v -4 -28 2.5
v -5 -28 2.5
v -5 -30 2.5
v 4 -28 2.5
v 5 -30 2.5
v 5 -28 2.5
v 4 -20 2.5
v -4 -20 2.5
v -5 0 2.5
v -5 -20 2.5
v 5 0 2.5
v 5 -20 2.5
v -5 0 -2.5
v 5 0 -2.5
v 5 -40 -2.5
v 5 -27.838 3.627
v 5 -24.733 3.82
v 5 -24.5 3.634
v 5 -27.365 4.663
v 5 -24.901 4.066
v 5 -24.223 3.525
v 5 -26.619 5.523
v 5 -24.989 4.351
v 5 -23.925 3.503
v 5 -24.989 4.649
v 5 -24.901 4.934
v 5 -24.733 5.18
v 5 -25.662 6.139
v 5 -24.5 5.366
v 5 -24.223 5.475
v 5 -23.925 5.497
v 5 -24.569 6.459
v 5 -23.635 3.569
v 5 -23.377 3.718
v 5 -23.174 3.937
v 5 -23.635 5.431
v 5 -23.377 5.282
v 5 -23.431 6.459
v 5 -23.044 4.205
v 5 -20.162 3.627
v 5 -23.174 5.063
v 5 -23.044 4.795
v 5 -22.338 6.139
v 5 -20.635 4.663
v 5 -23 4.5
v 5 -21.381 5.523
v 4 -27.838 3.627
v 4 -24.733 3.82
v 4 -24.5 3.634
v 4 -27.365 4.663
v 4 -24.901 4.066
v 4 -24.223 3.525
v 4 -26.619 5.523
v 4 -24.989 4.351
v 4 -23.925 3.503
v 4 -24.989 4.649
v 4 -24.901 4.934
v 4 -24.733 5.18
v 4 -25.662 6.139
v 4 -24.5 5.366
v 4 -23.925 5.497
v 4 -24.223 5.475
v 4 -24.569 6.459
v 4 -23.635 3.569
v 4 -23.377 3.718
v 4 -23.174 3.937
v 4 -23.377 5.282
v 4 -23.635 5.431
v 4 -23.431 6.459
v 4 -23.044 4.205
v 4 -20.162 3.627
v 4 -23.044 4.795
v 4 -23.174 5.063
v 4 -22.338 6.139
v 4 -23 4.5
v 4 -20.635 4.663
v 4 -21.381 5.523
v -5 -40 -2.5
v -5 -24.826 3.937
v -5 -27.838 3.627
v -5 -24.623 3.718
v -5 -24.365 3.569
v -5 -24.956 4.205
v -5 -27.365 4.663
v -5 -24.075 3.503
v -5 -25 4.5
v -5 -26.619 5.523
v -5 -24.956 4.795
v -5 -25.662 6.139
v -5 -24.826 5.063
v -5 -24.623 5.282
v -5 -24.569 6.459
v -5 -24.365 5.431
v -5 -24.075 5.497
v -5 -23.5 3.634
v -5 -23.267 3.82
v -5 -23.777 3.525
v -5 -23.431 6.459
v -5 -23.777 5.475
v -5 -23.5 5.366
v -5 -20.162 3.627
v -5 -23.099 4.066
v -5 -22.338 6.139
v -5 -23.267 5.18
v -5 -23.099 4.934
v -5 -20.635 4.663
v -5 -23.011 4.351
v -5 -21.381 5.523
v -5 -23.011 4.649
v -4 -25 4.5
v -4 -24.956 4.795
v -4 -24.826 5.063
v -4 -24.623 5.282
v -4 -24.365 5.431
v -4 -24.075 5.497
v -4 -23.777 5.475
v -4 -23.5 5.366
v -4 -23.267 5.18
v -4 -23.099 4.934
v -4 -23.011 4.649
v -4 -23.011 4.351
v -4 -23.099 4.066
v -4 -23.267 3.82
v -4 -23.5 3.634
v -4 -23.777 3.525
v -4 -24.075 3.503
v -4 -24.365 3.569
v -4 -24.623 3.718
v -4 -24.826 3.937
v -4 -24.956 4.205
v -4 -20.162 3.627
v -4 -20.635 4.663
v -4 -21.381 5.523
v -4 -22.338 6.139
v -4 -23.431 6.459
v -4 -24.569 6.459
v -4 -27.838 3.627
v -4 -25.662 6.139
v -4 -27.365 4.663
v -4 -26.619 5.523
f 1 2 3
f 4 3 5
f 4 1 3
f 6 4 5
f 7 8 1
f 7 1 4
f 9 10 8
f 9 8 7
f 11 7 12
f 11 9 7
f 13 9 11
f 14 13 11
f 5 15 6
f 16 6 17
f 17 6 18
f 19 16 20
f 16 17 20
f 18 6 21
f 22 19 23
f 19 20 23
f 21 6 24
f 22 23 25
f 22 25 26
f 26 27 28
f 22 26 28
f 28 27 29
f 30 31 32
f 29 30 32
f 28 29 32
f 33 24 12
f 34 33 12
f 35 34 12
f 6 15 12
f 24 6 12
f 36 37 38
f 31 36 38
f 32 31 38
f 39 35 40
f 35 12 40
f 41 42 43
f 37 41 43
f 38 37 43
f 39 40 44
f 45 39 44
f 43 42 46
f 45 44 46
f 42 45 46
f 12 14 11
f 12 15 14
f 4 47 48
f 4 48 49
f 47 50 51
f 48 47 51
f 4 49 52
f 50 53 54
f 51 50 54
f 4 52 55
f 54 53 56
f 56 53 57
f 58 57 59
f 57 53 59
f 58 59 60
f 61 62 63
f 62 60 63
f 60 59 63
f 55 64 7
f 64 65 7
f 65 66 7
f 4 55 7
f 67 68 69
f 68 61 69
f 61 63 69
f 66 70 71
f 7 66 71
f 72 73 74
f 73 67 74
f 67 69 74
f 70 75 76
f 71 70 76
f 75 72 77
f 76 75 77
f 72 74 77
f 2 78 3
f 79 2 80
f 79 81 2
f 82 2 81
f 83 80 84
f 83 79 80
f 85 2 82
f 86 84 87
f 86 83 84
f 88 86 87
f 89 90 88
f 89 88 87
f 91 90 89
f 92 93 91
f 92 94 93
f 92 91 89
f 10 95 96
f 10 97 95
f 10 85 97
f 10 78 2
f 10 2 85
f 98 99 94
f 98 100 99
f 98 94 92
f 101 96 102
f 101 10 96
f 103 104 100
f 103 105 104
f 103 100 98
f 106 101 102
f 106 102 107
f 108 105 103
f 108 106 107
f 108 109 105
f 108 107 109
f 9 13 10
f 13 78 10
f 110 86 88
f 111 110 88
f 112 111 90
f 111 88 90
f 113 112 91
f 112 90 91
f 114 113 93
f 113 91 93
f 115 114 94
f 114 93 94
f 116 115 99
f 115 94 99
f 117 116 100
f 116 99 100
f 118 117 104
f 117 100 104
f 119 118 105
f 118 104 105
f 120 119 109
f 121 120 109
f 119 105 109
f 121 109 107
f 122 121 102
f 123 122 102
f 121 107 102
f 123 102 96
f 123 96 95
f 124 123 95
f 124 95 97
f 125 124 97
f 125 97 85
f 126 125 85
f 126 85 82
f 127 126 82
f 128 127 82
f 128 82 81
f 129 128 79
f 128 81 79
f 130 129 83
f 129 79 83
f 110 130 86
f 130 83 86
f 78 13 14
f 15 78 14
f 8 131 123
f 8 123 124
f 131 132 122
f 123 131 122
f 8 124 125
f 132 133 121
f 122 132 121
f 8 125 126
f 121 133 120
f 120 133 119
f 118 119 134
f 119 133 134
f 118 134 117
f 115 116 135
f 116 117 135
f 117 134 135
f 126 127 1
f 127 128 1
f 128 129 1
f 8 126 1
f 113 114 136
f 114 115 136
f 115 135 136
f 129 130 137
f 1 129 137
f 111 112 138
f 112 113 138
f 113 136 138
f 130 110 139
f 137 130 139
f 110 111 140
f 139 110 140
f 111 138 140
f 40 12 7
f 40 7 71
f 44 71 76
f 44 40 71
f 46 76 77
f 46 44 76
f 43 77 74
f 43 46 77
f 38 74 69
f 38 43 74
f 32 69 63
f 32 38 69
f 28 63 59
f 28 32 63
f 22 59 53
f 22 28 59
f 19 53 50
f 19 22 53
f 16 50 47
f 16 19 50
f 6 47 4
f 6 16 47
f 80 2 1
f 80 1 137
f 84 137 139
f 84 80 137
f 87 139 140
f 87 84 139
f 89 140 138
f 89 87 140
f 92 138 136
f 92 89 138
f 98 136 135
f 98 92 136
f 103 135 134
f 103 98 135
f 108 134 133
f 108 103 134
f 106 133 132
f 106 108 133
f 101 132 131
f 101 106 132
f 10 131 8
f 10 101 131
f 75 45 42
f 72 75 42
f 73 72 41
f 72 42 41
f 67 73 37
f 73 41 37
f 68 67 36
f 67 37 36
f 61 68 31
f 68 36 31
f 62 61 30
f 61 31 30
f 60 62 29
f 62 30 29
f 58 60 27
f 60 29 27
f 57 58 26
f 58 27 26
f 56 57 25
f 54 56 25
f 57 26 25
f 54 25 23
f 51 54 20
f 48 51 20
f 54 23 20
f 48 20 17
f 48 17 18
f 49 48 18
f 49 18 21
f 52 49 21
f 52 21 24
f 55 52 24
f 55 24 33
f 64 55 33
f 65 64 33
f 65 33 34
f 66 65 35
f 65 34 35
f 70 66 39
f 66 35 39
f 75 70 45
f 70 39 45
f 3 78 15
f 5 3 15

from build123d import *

# Parameters (mm, degrees)
F0_W     = 10
F0_H     = 5
F1_DEPTH = 40
F2_R     = 1
F3_DEPTH = 1
F4_R     = 1
F5_DEPTH = 1
F6_SIZE2 = 4.99999
F6_SIZE  = 9.99999


# Not quite as in the source:
# - a fillet or chamfer is up to 0.001 mm smaller than in the source, because OpenCascade refuses the exact size


with BuildPart() as f1:
    # F0 (on Front) → F1 (new body)
    with BuildSketch(Plane.XZ):
        Rectangle(F0_W, F0_H)
    extrude(amount=F1_DEPTH)

    # F2 (on face) → F3 (join)
    with BuildSketch(Plane.YZ.offset(5)):
        with BuildLine():
            Line((-24, 2.5), (-20, 2.5))
            ThreePointArc((-20, 2.5), (-24, 6.5), (-28, 2.5))
            Line((-28, 2.5), (-24, 2.5))
        make_face()
        with Locations((-24, 4.5)):
            Circle(F2_R, mode=Mode.SUBTRACT)
    extrude(amount=-F3_DEPTH)

    # F4 (on face) → F5 (join)
    with BuildSketch(Plane(origin=(-5, 0, 0), x_dir=(0, -1, 0), z_dir=(-1, 0, 0))):
        with BuildLine():
            ThreePointArc((28, 2.5), (24, 6.5), (20, 2.5))
            Line((20, 2.5), (24, 2.5))
            Line((24, 2.5), (28, 2.5))
        make_face()
        with Locations((24, 4.5)):
            Circle(F4_R, mode=Mode.SUBTRACT)
    extrude(amount=-F5_DEPTH)

    # F6 (size 10 and 5 in the source; OpenCascade refuses exactly that, so slightly less here)
    f6_edges = [f1.edges().sort_by_distance(p)[0] for p in [
        (0, -40, 2.5),
    ]]
    f6_side = f1.faces().sort_by_distance((0, -19.833333, 2.5))[0]
    chamfer(f6_edges, length=F6_SIZE, length2=F6_SIZE2, reference=f6_side)


solid = f1.part
